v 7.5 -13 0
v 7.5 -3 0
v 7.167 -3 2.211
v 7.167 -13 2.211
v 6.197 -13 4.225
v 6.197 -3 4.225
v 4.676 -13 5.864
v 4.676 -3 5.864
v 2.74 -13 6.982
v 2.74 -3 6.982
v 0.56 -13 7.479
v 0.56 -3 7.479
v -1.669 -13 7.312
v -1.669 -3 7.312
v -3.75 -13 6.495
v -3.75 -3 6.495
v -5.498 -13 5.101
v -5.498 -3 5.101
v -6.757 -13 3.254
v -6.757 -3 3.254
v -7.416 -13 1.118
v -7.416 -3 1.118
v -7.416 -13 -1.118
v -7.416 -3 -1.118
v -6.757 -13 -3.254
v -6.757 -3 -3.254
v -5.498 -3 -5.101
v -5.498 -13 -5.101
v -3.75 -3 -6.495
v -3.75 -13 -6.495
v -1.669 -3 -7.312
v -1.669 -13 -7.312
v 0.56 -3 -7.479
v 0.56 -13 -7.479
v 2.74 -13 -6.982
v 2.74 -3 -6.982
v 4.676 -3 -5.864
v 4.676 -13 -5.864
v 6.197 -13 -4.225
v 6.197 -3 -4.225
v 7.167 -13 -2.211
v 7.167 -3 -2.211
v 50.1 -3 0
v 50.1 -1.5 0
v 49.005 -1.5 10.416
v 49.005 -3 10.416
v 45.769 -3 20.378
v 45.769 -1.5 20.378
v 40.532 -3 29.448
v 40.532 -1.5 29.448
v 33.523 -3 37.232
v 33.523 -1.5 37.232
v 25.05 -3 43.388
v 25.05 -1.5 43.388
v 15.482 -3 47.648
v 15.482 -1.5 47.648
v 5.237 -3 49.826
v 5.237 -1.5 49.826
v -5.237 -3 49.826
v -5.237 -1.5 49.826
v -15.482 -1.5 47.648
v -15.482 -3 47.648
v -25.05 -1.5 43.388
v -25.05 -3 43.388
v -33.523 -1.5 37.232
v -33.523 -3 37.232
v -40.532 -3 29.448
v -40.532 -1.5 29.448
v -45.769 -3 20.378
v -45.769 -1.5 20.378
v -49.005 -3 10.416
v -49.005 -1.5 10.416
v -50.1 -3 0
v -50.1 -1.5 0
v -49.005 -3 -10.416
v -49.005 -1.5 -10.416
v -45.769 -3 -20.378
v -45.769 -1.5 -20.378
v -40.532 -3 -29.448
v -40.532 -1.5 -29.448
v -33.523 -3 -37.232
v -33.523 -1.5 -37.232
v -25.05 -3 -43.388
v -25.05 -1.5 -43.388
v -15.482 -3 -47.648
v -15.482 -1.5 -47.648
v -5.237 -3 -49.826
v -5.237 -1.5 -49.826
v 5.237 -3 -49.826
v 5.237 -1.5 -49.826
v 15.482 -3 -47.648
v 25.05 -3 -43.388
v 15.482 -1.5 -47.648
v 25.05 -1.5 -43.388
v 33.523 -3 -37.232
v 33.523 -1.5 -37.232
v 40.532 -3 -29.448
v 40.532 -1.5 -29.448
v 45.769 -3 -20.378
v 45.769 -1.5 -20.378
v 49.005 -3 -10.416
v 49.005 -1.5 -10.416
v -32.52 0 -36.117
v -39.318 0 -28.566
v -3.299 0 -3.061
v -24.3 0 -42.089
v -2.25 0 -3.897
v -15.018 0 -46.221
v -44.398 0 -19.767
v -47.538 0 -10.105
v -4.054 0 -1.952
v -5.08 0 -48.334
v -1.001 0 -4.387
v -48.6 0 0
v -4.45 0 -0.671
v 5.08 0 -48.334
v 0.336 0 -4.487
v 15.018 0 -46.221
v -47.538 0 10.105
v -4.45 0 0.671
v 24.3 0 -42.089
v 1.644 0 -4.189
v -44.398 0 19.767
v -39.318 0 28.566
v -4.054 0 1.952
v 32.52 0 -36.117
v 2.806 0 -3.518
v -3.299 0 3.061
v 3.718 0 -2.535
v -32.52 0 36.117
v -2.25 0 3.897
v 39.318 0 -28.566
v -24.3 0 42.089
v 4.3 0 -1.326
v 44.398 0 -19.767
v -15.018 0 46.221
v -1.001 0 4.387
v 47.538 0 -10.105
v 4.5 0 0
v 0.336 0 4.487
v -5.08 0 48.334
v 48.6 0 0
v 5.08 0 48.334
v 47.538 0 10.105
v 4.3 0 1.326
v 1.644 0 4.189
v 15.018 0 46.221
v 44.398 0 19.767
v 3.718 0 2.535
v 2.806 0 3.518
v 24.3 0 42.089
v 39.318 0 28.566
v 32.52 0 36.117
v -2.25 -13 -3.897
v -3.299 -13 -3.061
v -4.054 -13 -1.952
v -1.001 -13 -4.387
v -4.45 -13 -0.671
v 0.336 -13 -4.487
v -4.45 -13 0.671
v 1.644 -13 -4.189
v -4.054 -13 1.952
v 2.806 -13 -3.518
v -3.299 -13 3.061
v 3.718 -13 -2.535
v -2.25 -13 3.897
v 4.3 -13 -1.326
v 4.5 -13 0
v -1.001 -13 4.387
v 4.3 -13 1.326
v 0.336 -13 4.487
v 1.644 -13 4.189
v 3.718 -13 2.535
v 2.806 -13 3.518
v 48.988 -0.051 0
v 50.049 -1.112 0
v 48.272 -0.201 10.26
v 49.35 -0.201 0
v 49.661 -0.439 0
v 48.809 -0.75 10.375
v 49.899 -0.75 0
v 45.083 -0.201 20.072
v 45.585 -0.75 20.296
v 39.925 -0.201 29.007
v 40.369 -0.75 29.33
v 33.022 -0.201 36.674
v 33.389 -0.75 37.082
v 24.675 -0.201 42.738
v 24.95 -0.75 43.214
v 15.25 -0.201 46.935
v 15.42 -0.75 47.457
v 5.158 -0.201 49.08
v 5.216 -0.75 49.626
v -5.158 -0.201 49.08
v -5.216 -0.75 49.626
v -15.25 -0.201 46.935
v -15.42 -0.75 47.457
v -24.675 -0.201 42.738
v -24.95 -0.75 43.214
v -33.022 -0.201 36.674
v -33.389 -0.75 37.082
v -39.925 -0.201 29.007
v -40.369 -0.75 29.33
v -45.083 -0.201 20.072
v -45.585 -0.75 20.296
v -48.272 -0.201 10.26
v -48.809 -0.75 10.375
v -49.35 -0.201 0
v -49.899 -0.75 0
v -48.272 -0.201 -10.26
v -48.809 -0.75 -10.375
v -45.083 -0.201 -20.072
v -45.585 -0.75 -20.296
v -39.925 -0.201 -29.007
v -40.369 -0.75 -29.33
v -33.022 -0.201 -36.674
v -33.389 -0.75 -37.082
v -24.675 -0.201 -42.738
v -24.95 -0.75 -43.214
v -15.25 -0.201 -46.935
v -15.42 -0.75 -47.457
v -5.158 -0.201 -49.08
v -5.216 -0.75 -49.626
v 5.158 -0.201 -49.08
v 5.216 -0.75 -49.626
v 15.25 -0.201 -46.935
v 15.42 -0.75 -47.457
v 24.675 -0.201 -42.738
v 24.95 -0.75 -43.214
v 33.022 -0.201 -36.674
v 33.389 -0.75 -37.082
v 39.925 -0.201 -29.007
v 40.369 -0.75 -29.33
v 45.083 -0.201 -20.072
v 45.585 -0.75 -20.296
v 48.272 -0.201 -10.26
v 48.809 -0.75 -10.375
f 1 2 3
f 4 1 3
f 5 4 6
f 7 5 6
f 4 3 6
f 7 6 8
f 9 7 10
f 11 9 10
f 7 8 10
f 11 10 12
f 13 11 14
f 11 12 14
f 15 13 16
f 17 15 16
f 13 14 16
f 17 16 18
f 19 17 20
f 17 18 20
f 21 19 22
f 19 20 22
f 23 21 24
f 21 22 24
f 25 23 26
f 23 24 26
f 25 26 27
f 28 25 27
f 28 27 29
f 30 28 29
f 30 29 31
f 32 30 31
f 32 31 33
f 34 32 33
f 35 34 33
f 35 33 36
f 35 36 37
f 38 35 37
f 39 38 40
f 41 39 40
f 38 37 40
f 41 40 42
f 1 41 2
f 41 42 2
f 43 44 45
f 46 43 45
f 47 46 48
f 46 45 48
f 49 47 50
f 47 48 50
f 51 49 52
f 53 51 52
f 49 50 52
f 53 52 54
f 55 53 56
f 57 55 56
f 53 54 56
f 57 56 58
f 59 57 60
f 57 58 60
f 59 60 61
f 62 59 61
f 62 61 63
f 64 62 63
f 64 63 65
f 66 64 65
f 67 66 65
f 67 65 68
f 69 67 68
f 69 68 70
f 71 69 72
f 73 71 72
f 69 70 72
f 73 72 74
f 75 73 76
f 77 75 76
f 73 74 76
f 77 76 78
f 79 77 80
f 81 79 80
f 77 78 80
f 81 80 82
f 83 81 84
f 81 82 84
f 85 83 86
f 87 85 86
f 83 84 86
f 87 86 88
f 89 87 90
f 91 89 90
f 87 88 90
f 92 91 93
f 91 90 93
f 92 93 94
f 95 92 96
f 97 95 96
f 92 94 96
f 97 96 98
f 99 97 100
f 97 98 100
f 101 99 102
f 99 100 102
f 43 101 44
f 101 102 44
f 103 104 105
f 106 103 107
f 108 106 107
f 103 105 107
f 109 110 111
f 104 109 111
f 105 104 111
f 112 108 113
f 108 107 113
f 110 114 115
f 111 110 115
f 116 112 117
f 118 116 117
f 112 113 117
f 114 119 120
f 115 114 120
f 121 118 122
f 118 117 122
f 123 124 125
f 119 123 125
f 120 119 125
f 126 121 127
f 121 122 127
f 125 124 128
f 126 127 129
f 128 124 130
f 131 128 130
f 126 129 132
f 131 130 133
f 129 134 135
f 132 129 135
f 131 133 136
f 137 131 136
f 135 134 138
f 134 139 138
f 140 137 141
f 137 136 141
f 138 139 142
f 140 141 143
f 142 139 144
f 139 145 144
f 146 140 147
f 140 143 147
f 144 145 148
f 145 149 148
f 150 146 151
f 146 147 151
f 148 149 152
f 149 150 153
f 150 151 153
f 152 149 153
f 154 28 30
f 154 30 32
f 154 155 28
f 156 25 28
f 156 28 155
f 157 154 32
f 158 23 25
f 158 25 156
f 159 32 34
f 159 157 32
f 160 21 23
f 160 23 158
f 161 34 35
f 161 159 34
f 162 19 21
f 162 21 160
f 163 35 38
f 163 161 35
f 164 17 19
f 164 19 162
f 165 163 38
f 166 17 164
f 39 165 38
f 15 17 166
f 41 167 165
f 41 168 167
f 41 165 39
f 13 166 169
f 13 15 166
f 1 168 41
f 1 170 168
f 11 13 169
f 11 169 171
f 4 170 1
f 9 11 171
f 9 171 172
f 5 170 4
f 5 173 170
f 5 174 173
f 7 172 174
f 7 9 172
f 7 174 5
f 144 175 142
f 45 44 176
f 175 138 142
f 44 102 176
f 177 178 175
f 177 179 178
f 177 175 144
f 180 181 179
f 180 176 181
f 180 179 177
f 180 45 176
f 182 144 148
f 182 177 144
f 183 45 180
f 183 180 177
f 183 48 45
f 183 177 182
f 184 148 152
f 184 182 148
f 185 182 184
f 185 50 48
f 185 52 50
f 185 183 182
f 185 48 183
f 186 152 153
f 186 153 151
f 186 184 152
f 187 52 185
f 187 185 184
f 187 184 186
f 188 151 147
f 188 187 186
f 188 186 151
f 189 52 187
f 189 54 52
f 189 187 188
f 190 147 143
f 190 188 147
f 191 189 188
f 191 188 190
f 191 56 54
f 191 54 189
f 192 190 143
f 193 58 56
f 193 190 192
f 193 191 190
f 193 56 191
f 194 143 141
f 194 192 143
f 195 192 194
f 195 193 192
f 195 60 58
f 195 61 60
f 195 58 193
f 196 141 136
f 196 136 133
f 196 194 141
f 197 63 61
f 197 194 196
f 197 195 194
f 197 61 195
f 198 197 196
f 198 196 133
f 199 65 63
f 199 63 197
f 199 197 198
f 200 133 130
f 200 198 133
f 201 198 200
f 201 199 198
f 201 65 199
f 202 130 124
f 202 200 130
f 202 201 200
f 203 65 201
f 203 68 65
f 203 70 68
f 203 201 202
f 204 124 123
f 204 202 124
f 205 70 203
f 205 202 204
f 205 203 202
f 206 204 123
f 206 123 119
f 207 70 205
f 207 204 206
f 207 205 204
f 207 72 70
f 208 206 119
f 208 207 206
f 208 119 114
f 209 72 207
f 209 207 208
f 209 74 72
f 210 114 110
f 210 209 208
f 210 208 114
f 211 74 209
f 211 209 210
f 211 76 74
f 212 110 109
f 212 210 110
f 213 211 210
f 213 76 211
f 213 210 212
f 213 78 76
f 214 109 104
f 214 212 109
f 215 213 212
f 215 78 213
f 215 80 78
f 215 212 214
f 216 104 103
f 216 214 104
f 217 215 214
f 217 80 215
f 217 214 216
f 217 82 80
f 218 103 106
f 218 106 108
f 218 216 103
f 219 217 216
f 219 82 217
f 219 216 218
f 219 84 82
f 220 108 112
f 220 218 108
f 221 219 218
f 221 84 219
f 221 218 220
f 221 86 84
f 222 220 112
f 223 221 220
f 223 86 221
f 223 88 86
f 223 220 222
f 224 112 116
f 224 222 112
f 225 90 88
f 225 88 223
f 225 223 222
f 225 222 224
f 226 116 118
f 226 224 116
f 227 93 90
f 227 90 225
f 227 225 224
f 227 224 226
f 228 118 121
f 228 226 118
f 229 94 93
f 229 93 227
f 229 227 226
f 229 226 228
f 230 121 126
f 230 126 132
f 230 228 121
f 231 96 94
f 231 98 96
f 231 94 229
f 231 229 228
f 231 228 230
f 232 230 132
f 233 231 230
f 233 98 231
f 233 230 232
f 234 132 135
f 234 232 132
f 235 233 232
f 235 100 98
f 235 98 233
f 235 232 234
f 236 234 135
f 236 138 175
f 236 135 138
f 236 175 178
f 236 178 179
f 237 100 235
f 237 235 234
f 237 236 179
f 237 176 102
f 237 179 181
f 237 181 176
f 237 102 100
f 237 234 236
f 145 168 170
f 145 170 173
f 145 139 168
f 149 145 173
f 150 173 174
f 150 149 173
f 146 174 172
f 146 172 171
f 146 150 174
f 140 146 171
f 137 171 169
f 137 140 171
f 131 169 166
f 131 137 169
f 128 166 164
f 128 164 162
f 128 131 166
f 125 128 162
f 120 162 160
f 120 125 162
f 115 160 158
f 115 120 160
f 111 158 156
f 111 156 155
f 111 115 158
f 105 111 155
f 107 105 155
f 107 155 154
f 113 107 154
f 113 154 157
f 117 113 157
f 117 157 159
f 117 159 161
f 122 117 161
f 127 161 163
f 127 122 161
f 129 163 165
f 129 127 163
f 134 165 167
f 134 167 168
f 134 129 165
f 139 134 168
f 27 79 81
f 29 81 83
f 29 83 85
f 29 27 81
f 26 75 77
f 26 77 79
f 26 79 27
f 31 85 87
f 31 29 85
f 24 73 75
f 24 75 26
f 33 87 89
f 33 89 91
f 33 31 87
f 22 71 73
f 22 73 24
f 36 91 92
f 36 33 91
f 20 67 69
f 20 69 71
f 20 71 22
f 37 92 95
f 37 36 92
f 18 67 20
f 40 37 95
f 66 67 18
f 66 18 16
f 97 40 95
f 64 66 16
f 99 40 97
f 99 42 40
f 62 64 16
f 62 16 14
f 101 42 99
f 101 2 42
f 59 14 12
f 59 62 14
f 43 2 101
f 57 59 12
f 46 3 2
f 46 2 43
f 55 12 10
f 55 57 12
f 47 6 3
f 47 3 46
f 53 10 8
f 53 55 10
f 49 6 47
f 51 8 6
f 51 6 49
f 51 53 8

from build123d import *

# Parameters (mm, degrees)
F0_R     = 50.1
F0_R_2   = 4.5
F1_DEPTH = 3
F2_R     = 7.5
F2_R_2   = 4.5
F3_DEPTH = 10
F4_R     = 1.5


with BuildPart() as f1:
    # F0 (on Front) → F1 (new body)
    with BuildSketch(Plane.XZ):
        Circle(F0_R)
        Circle(F0_R_2, mode=Mode.SUBTRACT)
    extrude(amount=F1_DEPTH)

    # F2 (on face) → F3 (join)
    with BuildSketch(Plane.XZ.offset(3)):
        Circle(F2_R)
        Circle(F2_R_2, mode=Mode.SUBTRACT)
    extrude(amount=F3_DEPTH)

    # F4
    f4_edges = [f1.edges().sort_by_distance(p)[0] for p in [
        (-50.1, 0, 0),
    ]]
    fillet(f4_edges, radius=F4_R)


solid = f1.part
